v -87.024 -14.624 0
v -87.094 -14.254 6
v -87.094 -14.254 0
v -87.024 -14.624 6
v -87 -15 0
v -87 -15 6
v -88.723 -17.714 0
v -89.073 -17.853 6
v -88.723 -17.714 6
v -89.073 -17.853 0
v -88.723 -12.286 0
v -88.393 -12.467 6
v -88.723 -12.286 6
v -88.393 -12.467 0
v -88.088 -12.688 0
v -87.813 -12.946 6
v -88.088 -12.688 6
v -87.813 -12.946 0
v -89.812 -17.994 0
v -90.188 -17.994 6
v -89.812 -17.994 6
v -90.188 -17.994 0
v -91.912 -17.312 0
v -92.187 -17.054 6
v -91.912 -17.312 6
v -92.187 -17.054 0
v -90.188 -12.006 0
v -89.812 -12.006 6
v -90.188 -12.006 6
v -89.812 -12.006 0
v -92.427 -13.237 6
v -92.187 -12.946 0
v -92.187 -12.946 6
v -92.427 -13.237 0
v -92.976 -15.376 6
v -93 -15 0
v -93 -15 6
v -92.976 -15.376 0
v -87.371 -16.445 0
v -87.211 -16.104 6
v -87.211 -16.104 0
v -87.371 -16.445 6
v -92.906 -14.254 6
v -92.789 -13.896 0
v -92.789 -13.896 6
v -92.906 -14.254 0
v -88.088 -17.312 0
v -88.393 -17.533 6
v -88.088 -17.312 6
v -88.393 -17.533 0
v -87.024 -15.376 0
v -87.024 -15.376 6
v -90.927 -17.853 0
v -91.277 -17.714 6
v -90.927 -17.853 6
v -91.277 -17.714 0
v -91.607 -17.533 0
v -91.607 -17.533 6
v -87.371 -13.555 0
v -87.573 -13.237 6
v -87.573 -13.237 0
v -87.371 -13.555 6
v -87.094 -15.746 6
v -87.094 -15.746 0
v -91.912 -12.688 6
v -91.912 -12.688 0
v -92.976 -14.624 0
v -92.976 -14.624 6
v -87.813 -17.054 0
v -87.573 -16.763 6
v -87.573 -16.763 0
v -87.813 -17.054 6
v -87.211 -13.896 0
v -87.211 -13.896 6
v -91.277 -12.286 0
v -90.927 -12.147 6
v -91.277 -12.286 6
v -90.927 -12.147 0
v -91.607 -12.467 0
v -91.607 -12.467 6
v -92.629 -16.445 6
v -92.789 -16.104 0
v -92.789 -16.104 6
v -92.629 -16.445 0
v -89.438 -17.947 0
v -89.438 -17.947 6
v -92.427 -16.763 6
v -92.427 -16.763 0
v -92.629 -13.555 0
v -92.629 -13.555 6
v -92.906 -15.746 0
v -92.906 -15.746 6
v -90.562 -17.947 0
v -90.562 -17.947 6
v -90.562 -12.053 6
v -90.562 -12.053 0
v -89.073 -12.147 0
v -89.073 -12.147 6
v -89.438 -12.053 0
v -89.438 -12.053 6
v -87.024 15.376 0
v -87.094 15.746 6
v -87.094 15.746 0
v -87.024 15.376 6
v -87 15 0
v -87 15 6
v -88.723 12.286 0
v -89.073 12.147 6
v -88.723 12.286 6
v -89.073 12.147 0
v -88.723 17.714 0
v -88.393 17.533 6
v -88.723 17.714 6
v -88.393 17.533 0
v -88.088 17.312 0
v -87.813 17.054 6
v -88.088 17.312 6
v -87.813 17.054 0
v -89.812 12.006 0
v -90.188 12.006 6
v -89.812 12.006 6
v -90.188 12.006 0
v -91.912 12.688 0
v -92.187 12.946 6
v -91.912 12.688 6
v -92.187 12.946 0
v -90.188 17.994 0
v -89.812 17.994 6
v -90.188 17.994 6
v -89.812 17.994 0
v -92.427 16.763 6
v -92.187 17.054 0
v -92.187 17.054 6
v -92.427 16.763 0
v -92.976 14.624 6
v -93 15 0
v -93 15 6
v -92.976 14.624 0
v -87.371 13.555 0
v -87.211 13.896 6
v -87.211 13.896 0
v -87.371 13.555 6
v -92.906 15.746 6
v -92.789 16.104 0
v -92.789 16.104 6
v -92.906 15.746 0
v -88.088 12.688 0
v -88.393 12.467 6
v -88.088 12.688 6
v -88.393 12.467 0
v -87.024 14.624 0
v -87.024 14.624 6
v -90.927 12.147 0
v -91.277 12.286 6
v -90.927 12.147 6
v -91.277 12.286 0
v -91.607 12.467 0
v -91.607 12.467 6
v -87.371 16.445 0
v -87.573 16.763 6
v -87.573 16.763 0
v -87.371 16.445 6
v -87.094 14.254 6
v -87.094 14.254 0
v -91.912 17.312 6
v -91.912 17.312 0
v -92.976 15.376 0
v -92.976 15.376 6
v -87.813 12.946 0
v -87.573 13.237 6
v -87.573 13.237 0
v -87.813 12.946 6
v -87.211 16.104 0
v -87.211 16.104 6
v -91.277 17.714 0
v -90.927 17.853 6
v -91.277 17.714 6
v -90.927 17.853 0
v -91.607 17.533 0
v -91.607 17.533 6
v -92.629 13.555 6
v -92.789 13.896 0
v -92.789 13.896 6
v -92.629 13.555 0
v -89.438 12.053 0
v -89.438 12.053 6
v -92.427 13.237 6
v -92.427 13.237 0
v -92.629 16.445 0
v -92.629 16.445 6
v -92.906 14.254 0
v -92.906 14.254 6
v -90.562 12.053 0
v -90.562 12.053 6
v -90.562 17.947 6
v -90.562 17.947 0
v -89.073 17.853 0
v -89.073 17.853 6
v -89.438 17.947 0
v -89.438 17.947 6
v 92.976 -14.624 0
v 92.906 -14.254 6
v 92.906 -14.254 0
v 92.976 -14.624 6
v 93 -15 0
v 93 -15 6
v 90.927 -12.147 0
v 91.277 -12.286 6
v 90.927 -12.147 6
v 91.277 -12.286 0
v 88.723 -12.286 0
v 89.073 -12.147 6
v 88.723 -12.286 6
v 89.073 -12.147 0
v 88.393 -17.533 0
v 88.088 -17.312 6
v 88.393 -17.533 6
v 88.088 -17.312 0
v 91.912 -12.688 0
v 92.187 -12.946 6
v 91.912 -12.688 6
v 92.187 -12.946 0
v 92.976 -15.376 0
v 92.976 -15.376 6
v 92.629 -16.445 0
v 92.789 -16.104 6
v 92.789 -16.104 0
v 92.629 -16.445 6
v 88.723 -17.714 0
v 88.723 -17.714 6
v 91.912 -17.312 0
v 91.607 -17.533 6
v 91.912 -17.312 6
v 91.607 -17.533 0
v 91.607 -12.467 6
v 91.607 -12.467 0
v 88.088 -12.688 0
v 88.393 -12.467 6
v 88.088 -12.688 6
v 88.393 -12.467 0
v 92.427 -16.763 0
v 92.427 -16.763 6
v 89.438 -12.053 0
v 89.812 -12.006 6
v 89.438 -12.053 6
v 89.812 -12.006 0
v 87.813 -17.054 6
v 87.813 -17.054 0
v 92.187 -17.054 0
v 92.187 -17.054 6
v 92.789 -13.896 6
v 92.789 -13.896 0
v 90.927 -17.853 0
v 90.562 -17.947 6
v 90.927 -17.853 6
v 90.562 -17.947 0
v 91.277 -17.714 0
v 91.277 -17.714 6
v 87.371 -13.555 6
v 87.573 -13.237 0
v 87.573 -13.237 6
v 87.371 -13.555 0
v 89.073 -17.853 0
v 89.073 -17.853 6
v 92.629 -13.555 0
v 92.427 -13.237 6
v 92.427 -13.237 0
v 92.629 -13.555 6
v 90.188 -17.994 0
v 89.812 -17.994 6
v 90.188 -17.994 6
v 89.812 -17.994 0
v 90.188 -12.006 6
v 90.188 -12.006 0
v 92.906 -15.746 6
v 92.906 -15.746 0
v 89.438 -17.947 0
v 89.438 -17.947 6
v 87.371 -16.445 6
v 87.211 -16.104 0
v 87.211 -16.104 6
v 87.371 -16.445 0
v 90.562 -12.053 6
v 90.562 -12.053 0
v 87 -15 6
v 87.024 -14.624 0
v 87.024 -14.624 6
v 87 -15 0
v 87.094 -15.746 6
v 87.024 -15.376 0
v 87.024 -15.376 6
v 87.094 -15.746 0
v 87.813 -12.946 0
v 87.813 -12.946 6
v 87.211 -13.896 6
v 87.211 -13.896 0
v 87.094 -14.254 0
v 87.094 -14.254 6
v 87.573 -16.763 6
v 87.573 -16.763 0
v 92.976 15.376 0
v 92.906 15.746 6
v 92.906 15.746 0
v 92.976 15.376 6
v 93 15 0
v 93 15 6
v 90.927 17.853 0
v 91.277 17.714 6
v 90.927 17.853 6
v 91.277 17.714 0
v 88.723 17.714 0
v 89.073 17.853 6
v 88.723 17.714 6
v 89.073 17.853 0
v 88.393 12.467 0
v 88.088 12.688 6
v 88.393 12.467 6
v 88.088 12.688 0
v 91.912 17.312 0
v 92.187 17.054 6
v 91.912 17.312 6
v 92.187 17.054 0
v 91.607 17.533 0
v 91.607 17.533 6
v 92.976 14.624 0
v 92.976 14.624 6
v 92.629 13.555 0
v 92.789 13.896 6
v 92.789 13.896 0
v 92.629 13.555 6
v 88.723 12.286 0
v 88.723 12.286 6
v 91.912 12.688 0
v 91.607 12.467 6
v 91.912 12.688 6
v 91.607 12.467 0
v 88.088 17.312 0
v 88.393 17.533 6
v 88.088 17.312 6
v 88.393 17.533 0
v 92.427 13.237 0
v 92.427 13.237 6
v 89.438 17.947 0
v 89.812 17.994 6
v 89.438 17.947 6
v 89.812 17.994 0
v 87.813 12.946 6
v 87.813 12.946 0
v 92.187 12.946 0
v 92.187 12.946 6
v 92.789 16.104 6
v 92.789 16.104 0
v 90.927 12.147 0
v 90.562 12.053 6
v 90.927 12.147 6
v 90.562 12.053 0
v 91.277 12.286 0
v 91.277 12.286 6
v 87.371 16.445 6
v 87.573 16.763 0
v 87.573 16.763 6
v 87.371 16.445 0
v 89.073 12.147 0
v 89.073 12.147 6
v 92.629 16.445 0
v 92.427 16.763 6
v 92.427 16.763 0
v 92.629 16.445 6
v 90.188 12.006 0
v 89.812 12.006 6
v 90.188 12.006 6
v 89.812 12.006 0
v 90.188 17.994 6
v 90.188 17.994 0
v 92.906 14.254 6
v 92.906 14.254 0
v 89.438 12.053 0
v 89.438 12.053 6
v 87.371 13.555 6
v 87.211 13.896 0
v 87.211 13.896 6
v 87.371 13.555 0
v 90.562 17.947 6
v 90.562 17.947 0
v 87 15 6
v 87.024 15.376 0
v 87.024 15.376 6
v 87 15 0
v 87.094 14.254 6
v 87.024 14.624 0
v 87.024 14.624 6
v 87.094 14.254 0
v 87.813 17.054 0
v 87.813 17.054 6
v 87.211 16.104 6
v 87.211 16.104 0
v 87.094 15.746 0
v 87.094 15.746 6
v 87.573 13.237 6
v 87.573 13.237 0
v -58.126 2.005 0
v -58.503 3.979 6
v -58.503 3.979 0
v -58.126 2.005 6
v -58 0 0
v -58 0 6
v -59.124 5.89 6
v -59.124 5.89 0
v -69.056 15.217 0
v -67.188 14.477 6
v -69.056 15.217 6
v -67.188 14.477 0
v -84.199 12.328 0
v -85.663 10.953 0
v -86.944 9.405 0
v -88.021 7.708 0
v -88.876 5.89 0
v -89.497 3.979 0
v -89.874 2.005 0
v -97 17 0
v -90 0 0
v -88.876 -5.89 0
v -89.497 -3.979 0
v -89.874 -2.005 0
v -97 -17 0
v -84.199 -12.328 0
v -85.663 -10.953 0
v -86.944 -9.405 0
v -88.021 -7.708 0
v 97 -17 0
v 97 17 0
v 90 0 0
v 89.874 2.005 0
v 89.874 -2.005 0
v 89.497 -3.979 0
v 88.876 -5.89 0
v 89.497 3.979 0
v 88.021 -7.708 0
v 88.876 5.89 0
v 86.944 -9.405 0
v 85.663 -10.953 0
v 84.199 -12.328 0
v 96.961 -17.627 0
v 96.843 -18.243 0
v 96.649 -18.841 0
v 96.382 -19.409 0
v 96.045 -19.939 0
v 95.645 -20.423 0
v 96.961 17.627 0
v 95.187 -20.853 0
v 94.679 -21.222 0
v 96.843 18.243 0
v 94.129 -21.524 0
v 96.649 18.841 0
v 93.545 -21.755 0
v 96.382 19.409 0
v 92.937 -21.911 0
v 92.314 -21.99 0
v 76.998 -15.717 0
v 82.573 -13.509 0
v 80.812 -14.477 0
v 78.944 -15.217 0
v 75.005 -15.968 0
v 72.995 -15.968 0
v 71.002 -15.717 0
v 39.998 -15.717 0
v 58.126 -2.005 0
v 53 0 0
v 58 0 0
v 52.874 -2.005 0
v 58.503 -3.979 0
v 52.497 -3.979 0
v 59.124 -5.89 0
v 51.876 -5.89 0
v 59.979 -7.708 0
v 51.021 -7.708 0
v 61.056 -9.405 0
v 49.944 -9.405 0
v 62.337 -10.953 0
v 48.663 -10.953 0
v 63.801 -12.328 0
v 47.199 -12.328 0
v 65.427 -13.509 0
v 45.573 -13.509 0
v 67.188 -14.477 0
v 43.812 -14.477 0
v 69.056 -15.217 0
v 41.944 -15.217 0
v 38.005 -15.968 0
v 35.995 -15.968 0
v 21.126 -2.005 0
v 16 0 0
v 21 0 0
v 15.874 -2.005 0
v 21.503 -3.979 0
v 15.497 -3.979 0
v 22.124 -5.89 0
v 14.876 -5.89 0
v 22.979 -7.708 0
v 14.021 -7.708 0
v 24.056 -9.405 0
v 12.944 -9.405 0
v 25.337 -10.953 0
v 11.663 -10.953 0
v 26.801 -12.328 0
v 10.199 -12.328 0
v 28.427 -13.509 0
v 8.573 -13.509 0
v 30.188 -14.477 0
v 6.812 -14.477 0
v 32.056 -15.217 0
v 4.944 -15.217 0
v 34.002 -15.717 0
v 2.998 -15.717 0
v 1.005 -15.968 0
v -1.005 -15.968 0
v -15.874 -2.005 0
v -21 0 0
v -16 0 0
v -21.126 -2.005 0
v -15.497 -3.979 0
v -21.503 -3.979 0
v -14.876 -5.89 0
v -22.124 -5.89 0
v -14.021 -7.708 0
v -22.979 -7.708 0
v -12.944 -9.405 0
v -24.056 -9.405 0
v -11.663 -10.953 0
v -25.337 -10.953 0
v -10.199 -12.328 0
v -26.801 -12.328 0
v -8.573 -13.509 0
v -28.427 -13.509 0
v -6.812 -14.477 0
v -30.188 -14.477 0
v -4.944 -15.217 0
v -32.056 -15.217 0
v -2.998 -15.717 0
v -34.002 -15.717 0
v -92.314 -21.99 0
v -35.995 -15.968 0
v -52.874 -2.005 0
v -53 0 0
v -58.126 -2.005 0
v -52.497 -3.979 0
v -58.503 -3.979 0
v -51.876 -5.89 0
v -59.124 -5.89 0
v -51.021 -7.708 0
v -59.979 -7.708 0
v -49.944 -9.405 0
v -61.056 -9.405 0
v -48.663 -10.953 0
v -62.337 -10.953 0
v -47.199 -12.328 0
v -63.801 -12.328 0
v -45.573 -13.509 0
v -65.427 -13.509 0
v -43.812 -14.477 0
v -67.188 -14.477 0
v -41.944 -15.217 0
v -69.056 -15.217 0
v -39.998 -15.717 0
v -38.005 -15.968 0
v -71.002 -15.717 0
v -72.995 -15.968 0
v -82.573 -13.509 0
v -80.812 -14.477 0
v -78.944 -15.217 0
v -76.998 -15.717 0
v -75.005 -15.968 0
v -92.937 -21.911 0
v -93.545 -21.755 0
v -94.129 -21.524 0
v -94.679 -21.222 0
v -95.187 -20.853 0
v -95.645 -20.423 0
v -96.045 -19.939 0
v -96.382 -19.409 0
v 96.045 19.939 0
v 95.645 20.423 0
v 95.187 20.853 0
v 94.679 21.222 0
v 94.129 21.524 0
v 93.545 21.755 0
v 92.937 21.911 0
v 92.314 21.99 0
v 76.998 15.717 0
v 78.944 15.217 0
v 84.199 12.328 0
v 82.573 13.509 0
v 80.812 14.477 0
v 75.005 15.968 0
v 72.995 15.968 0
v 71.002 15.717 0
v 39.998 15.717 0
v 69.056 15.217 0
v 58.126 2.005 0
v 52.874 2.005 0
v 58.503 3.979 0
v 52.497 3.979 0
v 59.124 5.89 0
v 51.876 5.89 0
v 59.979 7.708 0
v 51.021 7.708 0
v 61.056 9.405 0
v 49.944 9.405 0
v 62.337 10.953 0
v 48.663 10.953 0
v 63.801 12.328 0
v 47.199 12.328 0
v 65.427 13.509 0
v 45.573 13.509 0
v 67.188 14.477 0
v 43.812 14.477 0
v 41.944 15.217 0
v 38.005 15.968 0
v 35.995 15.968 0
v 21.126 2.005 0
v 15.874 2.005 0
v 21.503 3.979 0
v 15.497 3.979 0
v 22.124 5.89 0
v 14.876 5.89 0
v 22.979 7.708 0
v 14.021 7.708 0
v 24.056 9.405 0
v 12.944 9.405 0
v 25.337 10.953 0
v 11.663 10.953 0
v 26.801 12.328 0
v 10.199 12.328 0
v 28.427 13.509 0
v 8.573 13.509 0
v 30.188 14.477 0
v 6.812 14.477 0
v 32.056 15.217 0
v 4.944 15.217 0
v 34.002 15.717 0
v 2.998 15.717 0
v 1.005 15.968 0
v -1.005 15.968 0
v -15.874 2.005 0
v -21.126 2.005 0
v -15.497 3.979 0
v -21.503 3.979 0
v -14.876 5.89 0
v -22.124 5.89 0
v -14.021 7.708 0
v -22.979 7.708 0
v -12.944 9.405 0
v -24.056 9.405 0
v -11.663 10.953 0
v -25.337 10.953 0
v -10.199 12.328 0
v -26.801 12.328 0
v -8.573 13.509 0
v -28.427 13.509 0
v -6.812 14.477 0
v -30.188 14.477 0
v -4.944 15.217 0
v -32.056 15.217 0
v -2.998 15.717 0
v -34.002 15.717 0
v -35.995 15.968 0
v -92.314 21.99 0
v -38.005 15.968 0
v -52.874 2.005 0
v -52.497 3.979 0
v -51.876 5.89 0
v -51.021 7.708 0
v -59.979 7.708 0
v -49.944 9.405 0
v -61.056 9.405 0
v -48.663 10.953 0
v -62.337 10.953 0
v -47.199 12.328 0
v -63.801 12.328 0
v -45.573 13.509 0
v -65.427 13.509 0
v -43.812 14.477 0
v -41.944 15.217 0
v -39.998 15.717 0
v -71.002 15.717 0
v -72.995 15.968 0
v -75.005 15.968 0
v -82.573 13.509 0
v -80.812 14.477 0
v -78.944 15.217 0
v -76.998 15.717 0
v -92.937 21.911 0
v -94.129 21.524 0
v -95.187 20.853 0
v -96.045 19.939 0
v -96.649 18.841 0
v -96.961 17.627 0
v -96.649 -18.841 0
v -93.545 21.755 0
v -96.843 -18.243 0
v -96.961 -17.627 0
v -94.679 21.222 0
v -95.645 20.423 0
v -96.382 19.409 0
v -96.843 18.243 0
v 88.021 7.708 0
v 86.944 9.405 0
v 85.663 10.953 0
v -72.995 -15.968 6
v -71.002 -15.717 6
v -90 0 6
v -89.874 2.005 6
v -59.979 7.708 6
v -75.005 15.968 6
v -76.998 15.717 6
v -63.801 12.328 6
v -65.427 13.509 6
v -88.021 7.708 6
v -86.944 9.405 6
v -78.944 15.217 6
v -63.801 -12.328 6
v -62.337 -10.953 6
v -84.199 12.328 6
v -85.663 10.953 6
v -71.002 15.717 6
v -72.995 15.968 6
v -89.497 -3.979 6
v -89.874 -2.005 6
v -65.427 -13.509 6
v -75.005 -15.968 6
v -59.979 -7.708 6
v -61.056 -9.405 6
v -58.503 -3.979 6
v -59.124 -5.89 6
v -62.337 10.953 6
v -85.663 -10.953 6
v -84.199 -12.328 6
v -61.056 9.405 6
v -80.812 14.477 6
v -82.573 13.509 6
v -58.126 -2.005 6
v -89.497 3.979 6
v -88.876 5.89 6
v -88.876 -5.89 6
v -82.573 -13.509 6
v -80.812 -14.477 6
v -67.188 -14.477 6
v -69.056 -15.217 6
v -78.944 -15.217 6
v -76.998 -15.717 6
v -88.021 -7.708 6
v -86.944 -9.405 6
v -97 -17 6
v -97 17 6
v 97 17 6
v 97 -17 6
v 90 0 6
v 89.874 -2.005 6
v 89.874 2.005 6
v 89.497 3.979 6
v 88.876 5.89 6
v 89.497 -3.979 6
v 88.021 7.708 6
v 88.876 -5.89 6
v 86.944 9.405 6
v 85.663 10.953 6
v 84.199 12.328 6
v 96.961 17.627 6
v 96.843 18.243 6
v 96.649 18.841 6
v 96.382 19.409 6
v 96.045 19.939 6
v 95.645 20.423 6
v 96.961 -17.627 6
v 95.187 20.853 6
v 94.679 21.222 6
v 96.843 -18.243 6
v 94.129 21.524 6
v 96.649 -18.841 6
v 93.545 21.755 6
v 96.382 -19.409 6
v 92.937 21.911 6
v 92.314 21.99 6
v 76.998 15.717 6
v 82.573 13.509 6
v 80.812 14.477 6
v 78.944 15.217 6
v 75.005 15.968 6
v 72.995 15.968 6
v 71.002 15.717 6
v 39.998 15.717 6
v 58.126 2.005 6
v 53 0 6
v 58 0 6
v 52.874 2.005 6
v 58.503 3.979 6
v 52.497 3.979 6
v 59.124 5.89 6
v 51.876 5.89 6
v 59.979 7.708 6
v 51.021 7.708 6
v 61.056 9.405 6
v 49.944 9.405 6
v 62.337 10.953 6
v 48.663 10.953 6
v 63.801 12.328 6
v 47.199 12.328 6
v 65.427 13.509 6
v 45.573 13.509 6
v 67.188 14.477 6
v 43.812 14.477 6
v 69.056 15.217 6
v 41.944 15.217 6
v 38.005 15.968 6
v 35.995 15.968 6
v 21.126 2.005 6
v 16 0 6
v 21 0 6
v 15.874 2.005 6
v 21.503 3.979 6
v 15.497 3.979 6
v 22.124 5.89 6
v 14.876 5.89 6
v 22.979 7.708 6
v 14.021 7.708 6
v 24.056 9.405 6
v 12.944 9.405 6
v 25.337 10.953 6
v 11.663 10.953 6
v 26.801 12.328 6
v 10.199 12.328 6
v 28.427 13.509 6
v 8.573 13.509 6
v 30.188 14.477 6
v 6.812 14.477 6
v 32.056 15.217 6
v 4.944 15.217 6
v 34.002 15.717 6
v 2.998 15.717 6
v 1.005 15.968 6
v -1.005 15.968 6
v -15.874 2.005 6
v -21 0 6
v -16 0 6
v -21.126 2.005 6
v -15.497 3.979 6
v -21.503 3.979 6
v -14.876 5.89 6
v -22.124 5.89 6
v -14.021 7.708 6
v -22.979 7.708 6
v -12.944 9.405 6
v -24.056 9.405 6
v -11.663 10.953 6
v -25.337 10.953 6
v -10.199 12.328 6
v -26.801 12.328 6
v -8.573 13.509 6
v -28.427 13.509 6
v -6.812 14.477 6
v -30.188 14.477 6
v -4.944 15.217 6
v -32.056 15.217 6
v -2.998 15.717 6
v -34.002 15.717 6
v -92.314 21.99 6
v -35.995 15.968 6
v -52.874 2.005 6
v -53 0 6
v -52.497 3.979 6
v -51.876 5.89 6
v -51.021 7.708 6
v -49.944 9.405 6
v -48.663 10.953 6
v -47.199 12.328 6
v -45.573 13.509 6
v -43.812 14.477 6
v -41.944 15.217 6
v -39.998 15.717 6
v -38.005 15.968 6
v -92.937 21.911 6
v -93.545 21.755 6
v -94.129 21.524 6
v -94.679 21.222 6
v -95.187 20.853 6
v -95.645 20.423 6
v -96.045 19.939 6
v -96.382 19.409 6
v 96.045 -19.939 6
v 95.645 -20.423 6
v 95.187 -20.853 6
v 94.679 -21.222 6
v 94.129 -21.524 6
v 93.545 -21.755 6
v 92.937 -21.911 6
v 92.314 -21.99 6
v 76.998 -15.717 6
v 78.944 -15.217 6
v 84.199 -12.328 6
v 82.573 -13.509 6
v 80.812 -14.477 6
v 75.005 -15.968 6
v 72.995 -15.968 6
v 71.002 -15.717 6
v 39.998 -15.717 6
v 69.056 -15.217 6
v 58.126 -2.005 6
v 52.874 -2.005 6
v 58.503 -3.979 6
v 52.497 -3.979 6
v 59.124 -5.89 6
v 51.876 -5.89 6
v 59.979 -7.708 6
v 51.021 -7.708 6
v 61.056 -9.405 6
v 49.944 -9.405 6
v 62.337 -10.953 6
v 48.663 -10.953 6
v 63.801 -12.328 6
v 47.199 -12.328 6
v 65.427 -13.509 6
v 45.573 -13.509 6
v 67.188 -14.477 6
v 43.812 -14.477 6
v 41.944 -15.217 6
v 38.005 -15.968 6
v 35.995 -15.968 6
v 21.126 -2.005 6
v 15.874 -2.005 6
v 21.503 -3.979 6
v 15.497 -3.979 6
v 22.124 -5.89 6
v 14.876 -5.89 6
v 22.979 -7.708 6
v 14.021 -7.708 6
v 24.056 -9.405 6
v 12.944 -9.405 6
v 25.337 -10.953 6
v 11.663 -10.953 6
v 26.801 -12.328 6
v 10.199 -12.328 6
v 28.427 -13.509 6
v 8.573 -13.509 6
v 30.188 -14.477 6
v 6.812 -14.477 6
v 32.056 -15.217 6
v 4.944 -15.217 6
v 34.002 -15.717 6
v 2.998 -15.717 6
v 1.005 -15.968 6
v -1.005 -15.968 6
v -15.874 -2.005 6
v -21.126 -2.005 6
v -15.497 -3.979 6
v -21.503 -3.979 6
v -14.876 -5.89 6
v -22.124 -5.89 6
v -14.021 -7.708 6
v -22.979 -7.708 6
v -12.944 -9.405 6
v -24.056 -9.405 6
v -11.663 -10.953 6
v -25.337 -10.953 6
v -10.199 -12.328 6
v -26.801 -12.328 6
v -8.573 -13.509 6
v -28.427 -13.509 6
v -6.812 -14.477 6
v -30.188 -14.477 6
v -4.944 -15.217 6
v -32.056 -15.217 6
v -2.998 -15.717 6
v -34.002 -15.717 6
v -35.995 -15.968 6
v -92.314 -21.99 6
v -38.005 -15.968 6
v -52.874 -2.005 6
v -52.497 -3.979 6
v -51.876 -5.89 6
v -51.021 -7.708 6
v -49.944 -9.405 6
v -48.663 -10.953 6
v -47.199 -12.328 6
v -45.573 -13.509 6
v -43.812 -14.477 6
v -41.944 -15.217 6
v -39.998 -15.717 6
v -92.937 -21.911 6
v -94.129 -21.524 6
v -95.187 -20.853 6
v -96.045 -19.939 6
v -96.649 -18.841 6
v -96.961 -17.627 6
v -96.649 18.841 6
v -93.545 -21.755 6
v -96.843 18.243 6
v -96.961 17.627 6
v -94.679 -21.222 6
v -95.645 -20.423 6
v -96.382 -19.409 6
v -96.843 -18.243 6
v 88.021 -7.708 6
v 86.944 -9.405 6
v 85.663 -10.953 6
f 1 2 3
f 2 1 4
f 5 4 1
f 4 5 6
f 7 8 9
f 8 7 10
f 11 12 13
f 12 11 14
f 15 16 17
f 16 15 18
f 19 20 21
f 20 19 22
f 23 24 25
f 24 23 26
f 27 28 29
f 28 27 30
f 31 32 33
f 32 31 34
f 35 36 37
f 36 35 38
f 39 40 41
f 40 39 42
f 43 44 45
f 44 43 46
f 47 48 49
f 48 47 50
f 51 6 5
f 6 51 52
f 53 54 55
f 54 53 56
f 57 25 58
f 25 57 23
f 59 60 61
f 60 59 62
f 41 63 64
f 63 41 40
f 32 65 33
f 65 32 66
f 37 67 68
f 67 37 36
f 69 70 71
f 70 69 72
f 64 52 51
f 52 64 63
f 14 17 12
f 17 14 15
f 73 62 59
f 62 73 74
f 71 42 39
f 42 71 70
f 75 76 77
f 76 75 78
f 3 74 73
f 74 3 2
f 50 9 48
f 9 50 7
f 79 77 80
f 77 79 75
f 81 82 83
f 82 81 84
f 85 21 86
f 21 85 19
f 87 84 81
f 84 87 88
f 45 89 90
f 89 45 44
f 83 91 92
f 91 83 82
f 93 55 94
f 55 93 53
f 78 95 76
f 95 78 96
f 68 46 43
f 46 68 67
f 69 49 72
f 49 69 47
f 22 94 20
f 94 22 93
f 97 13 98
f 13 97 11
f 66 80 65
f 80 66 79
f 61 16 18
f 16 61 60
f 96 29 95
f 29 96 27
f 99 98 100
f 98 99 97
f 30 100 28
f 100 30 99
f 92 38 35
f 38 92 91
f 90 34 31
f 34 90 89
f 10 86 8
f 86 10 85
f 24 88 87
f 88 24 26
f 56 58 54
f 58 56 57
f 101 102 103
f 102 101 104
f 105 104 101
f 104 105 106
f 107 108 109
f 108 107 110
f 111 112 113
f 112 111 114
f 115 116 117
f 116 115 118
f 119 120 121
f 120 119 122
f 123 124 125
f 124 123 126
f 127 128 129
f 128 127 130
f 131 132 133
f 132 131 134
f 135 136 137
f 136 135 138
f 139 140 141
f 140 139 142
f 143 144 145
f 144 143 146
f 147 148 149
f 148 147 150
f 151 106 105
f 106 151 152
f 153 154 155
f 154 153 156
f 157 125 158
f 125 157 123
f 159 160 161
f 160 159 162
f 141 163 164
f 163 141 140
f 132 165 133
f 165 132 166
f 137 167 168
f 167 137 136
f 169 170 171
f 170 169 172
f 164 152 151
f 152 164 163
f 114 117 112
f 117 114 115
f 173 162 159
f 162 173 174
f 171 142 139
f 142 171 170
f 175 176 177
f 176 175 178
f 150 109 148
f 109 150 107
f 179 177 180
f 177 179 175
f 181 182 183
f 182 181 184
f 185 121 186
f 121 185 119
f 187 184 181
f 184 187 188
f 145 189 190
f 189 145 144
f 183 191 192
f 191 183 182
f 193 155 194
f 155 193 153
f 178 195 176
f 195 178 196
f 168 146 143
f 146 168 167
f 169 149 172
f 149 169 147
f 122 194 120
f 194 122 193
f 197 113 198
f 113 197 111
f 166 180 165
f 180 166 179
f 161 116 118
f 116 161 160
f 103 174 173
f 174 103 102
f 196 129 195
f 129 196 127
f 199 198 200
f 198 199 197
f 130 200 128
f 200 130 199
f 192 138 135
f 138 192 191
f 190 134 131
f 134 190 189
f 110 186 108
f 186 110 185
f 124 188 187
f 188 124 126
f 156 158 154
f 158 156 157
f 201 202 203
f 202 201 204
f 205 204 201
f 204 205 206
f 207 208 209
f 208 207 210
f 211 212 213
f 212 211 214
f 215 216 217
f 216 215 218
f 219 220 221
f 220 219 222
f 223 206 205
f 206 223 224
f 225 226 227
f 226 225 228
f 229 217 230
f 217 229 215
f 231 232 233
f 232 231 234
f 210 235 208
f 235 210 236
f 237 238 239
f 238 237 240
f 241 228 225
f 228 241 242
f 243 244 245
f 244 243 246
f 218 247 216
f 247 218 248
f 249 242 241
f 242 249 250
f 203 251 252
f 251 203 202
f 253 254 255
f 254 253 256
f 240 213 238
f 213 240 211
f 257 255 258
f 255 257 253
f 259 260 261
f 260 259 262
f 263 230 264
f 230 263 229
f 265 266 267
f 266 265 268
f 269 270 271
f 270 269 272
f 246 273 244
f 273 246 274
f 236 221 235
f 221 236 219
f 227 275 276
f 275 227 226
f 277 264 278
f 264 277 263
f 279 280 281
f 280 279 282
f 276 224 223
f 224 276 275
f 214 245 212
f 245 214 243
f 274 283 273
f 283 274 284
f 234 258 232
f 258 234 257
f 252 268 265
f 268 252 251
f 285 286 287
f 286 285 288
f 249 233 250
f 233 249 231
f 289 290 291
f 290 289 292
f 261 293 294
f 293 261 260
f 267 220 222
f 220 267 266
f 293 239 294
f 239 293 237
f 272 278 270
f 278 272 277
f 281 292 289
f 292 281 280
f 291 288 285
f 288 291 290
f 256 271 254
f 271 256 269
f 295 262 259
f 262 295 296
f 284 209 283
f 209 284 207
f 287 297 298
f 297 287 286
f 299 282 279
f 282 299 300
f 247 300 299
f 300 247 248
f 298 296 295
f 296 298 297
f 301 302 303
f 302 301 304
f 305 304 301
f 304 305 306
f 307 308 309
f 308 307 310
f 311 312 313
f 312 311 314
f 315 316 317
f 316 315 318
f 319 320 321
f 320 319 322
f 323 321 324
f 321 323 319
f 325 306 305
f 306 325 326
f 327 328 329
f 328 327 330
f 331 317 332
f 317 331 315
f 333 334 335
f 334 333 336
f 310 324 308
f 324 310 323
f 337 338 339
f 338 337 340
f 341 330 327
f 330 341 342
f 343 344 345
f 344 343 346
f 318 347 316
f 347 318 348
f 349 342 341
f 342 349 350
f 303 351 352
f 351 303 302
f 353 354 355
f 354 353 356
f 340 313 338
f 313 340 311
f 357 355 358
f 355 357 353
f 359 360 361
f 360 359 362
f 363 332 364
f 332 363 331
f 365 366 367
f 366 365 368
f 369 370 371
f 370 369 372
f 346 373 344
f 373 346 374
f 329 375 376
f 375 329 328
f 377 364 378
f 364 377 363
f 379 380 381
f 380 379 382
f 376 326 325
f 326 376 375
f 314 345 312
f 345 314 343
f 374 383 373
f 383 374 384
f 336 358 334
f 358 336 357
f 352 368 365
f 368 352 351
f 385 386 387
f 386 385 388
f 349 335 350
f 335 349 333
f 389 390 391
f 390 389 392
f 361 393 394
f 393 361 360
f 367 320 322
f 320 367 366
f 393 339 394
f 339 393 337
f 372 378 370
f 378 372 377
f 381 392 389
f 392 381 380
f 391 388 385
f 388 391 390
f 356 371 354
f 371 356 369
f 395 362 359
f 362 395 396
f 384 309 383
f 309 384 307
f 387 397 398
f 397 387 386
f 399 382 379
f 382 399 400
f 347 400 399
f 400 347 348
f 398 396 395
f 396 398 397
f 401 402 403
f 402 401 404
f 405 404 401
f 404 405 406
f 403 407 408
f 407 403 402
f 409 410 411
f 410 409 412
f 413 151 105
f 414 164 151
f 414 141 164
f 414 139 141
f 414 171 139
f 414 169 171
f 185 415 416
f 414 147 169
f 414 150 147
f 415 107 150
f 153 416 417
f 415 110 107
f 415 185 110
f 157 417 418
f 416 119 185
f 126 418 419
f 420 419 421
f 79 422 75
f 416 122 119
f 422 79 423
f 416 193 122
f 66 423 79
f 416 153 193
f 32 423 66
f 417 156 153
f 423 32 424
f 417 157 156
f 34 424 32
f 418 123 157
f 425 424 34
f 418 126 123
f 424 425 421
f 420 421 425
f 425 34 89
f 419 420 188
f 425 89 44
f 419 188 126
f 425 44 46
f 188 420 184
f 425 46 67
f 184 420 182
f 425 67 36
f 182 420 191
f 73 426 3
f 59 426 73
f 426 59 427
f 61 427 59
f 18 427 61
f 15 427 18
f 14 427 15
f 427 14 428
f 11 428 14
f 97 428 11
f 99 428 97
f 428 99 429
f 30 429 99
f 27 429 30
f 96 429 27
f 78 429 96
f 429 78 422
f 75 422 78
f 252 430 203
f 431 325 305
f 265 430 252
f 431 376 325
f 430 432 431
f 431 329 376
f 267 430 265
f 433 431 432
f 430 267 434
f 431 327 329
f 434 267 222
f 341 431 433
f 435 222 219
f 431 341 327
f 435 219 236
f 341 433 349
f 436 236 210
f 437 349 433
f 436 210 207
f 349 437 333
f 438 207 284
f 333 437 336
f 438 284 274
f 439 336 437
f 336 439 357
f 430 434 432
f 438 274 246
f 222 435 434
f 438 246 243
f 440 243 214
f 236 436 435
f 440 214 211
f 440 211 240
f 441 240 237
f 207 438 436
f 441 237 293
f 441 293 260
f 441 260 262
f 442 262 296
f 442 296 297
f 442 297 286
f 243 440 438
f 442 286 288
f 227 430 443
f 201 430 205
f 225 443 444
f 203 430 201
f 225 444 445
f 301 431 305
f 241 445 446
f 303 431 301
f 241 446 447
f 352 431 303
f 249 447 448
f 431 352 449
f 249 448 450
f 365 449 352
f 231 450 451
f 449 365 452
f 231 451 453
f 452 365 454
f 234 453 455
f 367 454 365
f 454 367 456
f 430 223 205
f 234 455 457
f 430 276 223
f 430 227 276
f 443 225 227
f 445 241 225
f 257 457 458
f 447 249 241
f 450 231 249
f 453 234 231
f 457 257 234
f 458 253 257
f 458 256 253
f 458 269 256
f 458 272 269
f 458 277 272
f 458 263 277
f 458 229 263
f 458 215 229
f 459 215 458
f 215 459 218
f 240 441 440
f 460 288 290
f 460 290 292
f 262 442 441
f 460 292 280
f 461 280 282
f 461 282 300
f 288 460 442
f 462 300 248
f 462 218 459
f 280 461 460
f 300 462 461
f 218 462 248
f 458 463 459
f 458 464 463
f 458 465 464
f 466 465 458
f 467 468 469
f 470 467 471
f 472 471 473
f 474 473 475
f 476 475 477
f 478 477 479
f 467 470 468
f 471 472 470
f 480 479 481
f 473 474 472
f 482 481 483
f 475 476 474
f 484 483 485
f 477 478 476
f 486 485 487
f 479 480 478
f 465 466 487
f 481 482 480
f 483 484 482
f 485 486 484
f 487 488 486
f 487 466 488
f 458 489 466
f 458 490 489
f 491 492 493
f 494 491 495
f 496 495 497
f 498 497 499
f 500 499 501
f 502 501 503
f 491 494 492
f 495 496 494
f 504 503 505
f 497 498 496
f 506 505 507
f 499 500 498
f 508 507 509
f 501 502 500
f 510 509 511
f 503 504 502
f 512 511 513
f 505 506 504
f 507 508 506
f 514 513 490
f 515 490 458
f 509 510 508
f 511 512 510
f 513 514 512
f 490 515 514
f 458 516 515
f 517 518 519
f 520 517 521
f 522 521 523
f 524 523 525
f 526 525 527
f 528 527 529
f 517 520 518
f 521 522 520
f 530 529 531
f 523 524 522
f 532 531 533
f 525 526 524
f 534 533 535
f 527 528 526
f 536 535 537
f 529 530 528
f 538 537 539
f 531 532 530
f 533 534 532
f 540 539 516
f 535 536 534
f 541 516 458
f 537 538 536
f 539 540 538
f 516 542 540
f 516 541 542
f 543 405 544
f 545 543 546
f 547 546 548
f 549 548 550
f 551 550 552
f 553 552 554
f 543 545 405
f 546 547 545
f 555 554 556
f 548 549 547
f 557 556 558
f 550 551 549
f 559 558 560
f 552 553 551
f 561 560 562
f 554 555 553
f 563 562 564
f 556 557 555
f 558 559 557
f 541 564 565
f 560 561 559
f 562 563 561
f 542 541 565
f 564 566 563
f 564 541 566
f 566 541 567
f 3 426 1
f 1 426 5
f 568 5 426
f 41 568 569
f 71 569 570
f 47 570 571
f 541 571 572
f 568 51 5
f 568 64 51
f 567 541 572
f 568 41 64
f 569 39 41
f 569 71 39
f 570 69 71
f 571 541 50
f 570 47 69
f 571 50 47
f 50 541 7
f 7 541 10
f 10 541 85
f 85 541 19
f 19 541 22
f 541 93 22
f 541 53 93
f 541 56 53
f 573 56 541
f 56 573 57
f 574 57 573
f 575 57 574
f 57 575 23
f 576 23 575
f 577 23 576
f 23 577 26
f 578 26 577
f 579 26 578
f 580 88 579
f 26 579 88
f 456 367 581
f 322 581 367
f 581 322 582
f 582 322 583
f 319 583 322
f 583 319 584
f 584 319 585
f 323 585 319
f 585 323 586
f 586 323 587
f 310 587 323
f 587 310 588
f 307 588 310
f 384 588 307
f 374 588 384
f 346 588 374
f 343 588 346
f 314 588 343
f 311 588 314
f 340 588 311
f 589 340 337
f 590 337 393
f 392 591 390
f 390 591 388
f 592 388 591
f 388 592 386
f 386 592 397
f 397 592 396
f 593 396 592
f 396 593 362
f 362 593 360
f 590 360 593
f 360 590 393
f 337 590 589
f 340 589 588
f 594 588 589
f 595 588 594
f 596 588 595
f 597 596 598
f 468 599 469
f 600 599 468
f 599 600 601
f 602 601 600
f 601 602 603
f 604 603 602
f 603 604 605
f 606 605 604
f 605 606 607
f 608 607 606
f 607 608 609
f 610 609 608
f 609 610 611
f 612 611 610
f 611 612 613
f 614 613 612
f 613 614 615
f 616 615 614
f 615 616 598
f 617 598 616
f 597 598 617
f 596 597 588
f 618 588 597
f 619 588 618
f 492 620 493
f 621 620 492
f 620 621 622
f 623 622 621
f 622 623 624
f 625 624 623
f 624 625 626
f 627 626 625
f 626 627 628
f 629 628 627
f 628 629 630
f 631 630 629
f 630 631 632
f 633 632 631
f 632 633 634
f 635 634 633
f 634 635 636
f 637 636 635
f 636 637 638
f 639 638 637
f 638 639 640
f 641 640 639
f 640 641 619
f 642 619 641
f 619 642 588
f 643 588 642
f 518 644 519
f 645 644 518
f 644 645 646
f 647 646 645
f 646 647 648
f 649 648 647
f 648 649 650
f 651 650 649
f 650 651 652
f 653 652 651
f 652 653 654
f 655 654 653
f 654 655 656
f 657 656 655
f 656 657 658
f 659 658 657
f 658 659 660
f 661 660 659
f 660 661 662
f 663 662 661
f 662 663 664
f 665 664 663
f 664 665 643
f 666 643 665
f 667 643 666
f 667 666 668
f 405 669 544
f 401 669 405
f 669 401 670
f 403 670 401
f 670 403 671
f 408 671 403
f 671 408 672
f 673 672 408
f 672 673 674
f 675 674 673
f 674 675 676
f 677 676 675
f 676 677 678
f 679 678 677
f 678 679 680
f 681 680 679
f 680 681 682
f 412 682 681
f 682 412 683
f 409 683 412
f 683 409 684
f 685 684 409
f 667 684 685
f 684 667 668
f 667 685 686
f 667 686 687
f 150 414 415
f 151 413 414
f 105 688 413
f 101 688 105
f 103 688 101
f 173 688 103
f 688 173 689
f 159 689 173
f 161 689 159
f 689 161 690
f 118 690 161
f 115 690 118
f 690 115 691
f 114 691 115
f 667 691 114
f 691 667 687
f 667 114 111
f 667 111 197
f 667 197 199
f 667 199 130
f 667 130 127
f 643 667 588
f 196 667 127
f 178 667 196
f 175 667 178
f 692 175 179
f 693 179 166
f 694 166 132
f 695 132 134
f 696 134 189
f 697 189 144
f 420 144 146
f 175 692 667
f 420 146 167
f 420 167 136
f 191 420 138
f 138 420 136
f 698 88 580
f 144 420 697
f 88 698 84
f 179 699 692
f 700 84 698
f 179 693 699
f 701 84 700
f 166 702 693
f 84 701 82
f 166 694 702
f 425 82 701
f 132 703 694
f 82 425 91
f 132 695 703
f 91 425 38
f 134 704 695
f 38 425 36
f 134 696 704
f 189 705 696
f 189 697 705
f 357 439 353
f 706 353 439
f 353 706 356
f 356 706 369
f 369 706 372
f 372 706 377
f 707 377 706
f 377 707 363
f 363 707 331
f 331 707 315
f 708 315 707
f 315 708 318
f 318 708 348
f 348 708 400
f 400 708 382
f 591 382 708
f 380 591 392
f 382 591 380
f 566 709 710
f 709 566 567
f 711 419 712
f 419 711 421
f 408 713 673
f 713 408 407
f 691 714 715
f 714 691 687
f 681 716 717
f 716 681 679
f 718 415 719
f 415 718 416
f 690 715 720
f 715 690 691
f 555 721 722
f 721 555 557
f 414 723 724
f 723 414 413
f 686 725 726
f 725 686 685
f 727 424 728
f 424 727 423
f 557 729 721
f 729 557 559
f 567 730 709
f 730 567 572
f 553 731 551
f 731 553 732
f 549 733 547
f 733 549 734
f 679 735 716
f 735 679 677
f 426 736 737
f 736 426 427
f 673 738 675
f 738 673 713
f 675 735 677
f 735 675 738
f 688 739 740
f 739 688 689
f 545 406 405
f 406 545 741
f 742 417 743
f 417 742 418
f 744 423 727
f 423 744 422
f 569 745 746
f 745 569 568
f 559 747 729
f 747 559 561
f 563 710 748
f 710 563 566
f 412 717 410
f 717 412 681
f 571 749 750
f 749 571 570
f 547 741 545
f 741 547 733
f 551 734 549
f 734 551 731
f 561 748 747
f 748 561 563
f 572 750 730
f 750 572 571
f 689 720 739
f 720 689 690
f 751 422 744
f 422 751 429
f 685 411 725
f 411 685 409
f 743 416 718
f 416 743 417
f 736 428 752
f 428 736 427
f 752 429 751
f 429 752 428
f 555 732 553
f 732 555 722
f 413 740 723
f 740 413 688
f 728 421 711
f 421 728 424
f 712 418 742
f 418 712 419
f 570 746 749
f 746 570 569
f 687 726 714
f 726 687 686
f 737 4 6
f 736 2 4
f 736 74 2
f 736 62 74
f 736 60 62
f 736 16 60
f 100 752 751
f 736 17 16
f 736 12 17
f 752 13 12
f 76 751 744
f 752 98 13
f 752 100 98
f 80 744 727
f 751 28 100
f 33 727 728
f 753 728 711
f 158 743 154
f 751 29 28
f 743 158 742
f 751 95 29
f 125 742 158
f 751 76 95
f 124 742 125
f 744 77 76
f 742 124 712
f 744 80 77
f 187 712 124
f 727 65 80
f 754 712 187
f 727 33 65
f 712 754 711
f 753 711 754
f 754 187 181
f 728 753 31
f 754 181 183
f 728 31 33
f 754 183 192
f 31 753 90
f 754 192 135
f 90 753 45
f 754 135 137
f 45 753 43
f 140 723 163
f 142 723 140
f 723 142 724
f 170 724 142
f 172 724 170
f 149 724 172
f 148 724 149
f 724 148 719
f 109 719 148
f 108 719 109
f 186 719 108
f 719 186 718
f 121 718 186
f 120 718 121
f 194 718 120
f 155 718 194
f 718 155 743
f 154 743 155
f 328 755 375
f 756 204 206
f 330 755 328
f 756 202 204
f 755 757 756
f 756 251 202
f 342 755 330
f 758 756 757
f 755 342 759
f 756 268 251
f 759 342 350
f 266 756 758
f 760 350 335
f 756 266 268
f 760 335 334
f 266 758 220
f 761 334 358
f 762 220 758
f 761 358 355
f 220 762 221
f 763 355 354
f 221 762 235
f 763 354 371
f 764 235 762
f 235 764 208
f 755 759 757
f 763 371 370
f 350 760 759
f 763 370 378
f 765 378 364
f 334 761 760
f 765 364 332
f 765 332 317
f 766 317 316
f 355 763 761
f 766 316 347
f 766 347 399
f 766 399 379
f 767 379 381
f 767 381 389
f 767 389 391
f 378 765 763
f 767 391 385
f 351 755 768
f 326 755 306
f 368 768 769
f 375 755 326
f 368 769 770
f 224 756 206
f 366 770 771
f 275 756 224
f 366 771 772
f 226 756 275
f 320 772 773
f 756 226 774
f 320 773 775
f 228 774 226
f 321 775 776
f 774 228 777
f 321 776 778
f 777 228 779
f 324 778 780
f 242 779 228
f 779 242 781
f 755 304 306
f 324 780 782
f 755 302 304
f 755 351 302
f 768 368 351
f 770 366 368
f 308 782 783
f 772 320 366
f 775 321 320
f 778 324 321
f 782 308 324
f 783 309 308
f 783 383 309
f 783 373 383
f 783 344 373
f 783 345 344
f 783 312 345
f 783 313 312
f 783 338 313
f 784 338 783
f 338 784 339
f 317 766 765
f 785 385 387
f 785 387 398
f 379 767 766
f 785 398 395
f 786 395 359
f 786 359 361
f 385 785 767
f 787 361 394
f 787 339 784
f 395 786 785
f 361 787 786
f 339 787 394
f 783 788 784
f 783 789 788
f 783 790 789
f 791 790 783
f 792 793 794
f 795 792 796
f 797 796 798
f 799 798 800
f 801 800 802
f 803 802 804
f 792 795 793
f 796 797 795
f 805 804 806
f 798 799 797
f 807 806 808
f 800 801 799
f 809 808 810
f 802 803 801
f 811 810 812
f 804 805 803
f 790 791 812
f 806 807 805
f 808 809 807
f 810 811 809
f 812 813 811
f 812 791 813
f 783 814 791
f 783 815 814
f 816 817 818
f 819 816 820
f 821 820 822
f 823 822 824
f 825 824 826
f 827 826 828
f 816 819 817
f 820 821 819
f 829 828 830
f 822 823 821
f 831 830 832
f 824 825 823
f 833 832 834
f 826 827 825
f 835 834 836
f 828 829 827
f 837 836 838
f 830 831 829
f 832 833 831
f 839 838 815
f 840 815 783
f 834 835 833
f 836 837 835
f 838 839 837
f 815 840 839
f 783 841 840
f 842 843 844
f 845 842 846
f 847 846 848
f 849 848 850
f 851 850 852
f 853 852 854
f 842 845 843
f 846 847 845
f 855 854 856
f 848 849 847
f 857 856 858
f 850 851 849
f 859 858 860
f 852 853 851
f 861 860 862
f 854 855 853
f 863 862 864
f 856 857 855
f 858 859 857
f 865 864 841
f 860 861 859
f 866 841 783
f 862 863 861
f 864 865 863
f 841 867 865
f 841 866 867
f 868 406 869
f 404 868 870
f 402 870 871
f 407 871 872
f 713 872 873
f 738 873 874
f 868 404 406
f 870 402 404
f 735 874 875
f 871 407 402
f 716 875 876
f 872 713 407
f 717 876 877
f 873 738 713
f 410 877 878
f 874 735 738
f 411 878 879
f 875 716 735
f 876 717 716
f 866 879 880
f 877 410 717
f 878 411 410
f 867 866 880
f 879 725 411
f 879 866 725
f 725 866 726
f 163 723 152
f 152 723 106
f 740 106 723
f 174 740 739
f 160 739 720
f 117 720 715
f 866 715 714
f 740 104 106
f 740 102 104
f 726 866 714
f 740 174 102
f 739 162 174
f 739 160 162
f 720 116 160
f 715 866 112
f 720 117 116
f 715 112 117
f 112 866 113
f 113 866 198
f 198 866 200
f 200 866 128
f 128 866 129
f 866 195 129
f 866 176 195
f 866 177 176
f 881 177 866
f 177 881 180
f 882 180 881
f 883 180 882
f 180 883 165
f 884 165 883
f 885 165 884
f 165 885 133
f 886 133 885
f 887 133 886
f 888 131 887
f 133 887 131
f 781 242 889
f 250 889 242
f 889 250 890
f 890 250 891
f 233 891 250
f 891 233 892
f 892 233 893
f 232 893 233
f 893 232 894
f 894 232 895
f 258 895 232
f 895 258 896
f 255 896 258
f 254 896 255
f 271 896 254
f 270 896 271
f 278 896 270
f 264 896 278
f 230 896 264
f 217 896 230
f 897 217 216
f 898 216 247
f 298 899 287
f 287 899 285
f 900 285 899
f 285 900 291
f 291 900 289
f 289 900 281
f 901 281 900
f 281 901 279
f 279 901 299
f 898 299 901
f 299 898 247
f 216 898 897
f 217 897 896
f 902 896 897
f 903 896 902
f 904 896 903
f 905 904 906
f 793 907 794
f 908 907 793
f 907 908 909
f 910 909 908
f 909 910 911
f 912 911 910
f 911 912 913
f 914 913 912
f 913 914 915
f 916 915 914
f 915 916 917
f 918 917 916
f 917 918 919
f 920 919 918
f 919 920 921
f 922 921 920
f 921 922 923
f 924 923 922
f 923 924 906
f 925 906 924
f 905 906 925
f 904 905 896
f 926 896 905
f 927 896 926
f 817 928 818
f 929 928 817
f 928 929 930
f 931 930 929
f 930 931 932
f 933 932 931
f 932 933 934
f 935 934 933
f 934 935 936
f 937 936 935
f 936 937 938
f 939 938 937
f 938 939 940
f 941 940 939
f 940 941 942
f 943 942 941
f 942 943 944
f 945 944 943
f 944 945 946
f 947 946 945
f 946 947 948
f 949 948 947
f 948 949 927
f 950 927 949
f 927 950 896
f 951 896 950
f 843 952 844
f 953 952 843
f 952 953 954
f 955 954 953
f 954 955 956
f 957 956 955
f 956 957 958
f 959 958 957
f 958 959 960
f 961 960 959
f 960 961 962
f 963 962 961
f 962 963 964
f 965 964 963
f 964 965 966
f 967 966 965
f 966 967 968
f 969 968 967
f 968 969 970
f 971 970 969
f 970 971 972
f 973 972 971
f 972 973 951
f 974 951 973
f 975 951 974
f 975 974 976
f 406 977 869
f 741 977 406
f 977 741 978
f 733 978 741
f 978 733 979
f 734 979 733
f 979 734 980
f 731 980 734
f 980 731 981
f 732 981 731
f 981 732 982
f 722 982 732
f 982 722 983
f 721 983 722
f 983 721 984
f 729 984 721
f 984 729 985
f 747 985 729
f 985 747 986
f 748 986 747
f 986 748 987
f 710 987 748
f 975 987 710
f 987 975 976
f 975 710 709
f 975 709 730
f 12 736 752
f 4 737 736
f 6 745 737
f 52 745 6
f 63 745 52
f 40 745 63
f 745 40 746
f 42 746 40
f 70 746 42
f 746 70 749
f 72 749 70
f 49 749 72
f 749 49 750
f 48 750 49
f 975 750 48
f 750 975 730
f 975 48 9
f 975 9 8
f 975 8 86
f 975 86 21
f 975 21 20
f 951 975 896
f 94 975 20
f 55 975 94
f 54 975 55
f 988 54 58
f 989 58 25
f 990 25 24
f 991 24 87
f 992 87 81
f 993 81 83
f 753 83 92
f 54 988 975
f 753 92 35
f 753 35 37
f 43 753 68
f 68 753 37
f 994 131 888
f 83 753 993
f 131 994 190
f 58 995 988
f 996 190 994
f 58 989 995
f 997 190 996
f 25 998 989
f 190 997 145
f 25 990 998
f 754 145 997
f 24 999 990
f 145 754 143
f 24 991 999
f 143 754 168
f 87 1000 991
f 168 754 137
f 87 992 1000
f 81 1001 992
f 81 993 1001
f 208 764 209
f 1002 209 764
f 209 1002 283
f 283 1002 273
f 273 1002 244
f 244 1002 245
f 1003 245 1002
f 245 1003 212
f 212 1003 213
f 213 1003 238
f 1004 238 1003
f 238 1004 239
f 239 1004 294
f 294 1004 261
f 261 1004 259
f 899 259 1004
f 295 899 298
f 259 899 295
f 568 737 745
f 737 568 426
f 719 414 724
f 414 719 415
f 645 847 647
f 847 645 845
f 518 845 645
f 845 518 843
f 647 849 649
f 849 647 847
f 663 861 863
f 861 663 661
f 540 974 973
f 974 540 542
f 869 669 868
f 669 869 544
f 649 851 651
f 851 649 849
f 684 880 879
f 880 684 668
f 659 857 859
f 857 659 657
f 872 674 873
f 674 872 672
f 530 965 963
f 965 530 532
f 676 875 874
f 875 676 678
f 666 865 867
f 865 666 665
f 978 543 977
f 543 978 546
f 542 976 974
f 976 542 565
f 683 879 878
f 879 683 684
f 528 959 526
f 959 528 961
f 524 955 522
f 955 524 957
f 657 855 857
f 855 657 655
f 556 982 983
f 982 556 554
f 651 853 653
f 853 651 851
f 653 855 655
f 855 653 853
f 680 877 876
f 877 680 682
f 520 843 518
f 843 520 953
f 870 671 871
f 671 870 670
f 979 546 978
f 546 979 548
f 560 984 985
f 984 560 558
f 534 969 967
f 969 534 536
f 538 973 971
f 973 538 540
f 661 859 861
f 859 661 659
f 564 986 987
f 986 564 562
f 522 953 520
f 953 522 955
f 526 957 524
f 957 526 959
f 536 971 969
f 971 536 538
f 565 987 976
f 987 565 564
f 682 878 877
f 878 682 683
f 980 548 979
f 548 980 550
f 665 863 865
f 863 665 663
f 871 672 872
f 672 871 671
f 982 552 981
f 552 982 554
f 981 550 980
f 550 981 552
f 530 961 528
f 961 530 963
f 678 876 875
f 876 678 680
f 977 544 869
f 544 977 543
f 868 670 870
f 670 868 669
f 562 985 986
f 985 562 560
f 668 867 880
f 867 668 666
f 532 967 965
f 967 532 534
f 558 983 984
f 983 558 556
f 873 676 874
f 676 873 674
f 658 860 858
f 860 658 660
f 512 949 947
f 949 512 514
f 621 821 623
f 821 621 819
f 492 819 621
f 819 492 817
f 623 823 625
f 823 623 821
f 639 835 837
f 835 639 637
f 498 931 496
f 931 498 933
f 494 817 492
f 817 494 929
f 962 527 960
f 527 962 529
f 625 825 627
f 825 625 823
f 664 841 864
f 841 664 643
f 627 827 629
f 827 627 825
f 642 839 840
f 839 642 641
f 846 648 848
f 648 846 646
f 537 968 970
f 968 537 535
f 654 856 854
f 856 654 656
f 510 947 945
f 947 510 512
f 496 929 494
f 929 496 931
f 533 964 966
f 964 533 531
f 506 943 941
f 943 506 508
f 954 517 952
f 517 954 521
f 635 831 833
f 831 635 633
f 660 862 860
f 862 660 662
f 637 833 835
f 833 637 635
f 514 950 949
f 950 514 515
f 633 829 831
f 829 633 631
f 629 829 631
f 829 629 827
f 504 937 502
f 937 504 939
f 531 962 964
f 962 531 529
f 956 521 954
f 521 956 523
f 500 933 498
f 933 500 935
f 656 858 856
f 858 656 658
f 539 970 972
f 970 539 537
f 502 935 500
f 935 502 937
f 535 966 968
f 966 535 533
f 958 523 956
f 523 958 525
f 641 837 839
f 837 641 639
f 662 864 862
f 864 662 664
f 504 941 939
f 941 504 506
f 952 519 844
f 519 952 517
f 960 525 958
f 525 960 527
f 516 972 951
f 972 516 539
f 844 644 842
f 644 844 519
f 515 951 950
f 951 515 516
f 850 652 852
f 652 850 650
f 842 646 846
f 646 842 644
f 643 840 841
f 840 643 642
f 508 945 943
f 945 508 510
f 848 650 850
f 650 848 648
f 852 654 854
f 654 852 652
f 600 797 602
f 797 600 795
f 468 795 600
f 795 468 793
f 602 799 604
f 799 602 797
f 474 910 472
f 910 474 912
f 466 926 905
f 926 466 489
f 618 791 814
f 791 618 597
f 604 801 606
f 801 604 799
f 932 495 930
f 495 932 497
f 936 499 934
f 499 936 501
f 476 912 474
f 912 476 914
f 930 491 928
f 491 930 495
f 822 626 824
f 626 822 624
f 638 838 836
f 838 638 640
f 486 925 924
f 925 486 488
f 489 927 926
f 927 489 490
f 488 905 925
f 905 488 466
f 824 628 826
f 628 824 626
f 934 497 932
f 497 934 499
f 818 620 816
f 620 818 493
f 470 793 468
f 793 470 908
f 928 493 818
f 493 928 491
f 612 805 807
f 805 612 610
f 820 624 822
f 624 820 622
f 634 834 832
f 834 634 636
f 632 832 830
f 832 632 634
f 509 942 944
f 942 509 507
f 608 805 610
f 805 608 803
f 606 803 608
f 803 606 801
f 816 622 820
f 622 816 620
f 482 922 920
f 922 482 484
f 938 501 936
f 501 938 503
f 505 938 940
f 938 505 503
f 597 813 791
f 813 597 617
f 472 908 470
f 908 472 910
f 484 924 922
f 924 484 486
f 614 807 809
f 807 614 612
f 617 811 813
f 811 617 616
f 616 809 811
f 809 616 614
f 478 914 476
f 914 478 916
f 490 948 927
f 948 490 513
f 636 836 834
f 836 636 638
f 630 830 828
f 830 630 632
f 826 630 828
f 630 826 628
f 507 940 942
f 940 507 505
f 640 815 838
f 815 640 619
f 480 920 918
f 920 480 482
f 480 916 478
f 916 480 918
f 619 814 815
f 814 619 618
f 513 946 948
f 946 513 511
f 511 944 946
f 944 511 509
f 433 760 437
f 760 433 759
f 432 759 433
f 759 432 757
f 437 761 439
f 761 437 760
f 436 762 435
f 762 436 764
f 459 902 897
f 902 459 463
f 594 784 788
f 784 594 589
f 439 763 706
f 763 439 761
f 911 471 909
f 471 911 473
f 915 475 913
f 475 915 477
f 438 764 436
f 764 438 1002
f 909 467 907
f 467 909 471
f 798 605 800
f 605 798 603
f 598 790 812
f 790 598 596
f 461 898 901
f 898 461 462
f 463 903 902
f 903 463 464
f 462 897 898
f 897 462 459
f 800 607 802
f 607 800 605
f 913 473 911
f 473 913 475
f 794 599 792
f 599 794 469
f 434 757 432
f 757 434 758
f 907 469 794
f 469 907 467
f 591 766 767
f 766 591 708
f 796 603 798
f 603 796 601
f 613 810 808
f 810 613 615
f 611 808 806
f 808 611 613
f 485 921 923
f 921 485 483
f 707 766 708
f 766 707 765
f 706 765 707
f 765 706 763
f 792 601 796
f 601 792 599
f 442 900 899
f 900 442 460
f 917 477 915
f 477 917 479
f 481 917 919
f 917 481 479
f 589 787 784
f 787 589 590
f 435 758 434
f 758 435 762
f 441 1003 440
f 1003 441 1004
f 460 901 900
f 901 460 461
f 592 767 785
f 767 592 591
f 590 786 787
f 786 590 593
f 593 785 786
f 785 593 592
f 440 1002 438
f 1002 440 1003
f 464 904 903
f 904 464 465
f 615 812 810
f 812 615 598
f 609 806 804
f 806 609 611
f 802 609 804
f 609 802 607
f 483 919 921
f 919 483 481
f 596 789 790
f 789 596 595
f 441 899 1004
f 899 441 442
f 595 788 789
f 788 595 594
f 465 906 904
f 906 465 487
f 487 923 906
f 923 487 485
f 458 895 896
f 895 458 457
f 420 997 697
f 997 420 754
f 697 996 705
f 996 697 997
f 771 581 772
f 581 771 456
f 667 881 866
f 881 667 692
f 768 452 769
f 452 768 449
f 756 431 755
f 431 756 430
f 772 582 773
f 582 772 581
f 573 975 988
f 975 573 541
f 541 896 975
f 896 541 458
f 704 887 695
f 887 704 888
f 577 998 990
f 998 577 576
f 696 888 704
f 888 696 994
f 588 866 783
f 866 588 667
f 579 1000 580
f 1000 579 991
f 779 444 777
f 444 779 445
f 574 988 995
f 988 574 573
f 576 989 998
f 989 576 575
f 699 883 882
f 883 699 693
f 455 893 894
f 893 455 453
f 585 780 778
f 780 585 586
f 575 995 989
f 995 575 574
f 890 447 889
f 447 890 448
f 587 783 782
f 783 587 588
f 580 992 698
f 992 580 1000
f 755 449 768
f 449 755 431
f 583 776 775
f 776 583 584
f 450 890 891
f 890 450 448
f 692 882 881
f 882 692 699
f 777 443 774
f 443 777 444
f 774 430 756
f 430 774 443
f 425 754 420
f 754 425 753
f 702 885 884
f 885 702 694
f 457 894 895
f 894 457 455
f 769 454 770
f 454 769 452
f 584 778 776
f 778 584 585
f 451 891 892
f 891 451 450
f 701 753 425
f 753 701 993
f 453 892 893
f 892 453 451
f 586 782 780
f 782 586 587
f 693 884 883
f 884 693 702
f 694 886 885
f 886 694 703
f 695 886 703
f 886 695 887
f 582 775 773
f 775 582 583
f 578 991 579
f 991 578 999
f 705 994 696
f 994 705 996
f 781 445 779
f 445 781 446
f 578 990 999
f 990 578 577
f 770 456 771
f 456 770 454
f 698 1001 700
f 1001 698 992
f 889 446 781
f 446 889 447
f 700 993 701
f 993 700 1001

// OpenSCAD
$fn = 50;


difference() {
	union() {
		hull() {
			translate(v = [-92.0000000000, 17.0000000000, 0]) {
				cylinder(h = 6, r = 5);
			}
			translate(v = [92.0000000000, 17.0000000000, 0]) {
				cylinder(h = 6, r = 5);
			}
			translate(v = [-92.0000000000, -17.0000000000, 0]) {
				cylinder(h = 6, r = 5);
			}
			translate(v = [92.0000000000, -17.0000000000, 0]) {
				cylinder(h = 6, r = 5);
			}
		}
	}
	union() {
		#translate(v = [-90.0000000000, -15.0000000000, -100.0000000000]) {
			cylinder(h = 200, r = 3.0000000000);
		}
		#translate(v = [-90.0000000000, 15.0000000000, -100.0000000000]) {
			cylinder(h = 200, r = 3.0000000000);
		}
		#translate(v = [90.0000000000, -15.0000000000, -100.0000000000]) {
			cylinder(h = 200, r = 3.0000000000);
		}
		#translate(v = [90.0000000000, 15.0000000000, -100.0000000000]) {
			cylinder(h = 200, r = 3.0000000000);
		}
		#translate(v = [-74.0000000000, 0, 0]) {
			cylinder(h = 6, r = 16.0000000000);
		}
		#translate(v = [-37.0000000000, 0, 0]) {
			cylinder(h = 6, r = 16.0000000000);
		}
		#cylinder(h = 6, r = 16.0000000000);
		#translate(v = [37.0000000000, 0, 0]) {
			cylinder(h = 6, r = 16.0000000000);
		}
		#translate(v = [74.0000000000, 0, 0]) {
			cylinder(h = 6, r = 16.0000000000);
		}
	}
}
